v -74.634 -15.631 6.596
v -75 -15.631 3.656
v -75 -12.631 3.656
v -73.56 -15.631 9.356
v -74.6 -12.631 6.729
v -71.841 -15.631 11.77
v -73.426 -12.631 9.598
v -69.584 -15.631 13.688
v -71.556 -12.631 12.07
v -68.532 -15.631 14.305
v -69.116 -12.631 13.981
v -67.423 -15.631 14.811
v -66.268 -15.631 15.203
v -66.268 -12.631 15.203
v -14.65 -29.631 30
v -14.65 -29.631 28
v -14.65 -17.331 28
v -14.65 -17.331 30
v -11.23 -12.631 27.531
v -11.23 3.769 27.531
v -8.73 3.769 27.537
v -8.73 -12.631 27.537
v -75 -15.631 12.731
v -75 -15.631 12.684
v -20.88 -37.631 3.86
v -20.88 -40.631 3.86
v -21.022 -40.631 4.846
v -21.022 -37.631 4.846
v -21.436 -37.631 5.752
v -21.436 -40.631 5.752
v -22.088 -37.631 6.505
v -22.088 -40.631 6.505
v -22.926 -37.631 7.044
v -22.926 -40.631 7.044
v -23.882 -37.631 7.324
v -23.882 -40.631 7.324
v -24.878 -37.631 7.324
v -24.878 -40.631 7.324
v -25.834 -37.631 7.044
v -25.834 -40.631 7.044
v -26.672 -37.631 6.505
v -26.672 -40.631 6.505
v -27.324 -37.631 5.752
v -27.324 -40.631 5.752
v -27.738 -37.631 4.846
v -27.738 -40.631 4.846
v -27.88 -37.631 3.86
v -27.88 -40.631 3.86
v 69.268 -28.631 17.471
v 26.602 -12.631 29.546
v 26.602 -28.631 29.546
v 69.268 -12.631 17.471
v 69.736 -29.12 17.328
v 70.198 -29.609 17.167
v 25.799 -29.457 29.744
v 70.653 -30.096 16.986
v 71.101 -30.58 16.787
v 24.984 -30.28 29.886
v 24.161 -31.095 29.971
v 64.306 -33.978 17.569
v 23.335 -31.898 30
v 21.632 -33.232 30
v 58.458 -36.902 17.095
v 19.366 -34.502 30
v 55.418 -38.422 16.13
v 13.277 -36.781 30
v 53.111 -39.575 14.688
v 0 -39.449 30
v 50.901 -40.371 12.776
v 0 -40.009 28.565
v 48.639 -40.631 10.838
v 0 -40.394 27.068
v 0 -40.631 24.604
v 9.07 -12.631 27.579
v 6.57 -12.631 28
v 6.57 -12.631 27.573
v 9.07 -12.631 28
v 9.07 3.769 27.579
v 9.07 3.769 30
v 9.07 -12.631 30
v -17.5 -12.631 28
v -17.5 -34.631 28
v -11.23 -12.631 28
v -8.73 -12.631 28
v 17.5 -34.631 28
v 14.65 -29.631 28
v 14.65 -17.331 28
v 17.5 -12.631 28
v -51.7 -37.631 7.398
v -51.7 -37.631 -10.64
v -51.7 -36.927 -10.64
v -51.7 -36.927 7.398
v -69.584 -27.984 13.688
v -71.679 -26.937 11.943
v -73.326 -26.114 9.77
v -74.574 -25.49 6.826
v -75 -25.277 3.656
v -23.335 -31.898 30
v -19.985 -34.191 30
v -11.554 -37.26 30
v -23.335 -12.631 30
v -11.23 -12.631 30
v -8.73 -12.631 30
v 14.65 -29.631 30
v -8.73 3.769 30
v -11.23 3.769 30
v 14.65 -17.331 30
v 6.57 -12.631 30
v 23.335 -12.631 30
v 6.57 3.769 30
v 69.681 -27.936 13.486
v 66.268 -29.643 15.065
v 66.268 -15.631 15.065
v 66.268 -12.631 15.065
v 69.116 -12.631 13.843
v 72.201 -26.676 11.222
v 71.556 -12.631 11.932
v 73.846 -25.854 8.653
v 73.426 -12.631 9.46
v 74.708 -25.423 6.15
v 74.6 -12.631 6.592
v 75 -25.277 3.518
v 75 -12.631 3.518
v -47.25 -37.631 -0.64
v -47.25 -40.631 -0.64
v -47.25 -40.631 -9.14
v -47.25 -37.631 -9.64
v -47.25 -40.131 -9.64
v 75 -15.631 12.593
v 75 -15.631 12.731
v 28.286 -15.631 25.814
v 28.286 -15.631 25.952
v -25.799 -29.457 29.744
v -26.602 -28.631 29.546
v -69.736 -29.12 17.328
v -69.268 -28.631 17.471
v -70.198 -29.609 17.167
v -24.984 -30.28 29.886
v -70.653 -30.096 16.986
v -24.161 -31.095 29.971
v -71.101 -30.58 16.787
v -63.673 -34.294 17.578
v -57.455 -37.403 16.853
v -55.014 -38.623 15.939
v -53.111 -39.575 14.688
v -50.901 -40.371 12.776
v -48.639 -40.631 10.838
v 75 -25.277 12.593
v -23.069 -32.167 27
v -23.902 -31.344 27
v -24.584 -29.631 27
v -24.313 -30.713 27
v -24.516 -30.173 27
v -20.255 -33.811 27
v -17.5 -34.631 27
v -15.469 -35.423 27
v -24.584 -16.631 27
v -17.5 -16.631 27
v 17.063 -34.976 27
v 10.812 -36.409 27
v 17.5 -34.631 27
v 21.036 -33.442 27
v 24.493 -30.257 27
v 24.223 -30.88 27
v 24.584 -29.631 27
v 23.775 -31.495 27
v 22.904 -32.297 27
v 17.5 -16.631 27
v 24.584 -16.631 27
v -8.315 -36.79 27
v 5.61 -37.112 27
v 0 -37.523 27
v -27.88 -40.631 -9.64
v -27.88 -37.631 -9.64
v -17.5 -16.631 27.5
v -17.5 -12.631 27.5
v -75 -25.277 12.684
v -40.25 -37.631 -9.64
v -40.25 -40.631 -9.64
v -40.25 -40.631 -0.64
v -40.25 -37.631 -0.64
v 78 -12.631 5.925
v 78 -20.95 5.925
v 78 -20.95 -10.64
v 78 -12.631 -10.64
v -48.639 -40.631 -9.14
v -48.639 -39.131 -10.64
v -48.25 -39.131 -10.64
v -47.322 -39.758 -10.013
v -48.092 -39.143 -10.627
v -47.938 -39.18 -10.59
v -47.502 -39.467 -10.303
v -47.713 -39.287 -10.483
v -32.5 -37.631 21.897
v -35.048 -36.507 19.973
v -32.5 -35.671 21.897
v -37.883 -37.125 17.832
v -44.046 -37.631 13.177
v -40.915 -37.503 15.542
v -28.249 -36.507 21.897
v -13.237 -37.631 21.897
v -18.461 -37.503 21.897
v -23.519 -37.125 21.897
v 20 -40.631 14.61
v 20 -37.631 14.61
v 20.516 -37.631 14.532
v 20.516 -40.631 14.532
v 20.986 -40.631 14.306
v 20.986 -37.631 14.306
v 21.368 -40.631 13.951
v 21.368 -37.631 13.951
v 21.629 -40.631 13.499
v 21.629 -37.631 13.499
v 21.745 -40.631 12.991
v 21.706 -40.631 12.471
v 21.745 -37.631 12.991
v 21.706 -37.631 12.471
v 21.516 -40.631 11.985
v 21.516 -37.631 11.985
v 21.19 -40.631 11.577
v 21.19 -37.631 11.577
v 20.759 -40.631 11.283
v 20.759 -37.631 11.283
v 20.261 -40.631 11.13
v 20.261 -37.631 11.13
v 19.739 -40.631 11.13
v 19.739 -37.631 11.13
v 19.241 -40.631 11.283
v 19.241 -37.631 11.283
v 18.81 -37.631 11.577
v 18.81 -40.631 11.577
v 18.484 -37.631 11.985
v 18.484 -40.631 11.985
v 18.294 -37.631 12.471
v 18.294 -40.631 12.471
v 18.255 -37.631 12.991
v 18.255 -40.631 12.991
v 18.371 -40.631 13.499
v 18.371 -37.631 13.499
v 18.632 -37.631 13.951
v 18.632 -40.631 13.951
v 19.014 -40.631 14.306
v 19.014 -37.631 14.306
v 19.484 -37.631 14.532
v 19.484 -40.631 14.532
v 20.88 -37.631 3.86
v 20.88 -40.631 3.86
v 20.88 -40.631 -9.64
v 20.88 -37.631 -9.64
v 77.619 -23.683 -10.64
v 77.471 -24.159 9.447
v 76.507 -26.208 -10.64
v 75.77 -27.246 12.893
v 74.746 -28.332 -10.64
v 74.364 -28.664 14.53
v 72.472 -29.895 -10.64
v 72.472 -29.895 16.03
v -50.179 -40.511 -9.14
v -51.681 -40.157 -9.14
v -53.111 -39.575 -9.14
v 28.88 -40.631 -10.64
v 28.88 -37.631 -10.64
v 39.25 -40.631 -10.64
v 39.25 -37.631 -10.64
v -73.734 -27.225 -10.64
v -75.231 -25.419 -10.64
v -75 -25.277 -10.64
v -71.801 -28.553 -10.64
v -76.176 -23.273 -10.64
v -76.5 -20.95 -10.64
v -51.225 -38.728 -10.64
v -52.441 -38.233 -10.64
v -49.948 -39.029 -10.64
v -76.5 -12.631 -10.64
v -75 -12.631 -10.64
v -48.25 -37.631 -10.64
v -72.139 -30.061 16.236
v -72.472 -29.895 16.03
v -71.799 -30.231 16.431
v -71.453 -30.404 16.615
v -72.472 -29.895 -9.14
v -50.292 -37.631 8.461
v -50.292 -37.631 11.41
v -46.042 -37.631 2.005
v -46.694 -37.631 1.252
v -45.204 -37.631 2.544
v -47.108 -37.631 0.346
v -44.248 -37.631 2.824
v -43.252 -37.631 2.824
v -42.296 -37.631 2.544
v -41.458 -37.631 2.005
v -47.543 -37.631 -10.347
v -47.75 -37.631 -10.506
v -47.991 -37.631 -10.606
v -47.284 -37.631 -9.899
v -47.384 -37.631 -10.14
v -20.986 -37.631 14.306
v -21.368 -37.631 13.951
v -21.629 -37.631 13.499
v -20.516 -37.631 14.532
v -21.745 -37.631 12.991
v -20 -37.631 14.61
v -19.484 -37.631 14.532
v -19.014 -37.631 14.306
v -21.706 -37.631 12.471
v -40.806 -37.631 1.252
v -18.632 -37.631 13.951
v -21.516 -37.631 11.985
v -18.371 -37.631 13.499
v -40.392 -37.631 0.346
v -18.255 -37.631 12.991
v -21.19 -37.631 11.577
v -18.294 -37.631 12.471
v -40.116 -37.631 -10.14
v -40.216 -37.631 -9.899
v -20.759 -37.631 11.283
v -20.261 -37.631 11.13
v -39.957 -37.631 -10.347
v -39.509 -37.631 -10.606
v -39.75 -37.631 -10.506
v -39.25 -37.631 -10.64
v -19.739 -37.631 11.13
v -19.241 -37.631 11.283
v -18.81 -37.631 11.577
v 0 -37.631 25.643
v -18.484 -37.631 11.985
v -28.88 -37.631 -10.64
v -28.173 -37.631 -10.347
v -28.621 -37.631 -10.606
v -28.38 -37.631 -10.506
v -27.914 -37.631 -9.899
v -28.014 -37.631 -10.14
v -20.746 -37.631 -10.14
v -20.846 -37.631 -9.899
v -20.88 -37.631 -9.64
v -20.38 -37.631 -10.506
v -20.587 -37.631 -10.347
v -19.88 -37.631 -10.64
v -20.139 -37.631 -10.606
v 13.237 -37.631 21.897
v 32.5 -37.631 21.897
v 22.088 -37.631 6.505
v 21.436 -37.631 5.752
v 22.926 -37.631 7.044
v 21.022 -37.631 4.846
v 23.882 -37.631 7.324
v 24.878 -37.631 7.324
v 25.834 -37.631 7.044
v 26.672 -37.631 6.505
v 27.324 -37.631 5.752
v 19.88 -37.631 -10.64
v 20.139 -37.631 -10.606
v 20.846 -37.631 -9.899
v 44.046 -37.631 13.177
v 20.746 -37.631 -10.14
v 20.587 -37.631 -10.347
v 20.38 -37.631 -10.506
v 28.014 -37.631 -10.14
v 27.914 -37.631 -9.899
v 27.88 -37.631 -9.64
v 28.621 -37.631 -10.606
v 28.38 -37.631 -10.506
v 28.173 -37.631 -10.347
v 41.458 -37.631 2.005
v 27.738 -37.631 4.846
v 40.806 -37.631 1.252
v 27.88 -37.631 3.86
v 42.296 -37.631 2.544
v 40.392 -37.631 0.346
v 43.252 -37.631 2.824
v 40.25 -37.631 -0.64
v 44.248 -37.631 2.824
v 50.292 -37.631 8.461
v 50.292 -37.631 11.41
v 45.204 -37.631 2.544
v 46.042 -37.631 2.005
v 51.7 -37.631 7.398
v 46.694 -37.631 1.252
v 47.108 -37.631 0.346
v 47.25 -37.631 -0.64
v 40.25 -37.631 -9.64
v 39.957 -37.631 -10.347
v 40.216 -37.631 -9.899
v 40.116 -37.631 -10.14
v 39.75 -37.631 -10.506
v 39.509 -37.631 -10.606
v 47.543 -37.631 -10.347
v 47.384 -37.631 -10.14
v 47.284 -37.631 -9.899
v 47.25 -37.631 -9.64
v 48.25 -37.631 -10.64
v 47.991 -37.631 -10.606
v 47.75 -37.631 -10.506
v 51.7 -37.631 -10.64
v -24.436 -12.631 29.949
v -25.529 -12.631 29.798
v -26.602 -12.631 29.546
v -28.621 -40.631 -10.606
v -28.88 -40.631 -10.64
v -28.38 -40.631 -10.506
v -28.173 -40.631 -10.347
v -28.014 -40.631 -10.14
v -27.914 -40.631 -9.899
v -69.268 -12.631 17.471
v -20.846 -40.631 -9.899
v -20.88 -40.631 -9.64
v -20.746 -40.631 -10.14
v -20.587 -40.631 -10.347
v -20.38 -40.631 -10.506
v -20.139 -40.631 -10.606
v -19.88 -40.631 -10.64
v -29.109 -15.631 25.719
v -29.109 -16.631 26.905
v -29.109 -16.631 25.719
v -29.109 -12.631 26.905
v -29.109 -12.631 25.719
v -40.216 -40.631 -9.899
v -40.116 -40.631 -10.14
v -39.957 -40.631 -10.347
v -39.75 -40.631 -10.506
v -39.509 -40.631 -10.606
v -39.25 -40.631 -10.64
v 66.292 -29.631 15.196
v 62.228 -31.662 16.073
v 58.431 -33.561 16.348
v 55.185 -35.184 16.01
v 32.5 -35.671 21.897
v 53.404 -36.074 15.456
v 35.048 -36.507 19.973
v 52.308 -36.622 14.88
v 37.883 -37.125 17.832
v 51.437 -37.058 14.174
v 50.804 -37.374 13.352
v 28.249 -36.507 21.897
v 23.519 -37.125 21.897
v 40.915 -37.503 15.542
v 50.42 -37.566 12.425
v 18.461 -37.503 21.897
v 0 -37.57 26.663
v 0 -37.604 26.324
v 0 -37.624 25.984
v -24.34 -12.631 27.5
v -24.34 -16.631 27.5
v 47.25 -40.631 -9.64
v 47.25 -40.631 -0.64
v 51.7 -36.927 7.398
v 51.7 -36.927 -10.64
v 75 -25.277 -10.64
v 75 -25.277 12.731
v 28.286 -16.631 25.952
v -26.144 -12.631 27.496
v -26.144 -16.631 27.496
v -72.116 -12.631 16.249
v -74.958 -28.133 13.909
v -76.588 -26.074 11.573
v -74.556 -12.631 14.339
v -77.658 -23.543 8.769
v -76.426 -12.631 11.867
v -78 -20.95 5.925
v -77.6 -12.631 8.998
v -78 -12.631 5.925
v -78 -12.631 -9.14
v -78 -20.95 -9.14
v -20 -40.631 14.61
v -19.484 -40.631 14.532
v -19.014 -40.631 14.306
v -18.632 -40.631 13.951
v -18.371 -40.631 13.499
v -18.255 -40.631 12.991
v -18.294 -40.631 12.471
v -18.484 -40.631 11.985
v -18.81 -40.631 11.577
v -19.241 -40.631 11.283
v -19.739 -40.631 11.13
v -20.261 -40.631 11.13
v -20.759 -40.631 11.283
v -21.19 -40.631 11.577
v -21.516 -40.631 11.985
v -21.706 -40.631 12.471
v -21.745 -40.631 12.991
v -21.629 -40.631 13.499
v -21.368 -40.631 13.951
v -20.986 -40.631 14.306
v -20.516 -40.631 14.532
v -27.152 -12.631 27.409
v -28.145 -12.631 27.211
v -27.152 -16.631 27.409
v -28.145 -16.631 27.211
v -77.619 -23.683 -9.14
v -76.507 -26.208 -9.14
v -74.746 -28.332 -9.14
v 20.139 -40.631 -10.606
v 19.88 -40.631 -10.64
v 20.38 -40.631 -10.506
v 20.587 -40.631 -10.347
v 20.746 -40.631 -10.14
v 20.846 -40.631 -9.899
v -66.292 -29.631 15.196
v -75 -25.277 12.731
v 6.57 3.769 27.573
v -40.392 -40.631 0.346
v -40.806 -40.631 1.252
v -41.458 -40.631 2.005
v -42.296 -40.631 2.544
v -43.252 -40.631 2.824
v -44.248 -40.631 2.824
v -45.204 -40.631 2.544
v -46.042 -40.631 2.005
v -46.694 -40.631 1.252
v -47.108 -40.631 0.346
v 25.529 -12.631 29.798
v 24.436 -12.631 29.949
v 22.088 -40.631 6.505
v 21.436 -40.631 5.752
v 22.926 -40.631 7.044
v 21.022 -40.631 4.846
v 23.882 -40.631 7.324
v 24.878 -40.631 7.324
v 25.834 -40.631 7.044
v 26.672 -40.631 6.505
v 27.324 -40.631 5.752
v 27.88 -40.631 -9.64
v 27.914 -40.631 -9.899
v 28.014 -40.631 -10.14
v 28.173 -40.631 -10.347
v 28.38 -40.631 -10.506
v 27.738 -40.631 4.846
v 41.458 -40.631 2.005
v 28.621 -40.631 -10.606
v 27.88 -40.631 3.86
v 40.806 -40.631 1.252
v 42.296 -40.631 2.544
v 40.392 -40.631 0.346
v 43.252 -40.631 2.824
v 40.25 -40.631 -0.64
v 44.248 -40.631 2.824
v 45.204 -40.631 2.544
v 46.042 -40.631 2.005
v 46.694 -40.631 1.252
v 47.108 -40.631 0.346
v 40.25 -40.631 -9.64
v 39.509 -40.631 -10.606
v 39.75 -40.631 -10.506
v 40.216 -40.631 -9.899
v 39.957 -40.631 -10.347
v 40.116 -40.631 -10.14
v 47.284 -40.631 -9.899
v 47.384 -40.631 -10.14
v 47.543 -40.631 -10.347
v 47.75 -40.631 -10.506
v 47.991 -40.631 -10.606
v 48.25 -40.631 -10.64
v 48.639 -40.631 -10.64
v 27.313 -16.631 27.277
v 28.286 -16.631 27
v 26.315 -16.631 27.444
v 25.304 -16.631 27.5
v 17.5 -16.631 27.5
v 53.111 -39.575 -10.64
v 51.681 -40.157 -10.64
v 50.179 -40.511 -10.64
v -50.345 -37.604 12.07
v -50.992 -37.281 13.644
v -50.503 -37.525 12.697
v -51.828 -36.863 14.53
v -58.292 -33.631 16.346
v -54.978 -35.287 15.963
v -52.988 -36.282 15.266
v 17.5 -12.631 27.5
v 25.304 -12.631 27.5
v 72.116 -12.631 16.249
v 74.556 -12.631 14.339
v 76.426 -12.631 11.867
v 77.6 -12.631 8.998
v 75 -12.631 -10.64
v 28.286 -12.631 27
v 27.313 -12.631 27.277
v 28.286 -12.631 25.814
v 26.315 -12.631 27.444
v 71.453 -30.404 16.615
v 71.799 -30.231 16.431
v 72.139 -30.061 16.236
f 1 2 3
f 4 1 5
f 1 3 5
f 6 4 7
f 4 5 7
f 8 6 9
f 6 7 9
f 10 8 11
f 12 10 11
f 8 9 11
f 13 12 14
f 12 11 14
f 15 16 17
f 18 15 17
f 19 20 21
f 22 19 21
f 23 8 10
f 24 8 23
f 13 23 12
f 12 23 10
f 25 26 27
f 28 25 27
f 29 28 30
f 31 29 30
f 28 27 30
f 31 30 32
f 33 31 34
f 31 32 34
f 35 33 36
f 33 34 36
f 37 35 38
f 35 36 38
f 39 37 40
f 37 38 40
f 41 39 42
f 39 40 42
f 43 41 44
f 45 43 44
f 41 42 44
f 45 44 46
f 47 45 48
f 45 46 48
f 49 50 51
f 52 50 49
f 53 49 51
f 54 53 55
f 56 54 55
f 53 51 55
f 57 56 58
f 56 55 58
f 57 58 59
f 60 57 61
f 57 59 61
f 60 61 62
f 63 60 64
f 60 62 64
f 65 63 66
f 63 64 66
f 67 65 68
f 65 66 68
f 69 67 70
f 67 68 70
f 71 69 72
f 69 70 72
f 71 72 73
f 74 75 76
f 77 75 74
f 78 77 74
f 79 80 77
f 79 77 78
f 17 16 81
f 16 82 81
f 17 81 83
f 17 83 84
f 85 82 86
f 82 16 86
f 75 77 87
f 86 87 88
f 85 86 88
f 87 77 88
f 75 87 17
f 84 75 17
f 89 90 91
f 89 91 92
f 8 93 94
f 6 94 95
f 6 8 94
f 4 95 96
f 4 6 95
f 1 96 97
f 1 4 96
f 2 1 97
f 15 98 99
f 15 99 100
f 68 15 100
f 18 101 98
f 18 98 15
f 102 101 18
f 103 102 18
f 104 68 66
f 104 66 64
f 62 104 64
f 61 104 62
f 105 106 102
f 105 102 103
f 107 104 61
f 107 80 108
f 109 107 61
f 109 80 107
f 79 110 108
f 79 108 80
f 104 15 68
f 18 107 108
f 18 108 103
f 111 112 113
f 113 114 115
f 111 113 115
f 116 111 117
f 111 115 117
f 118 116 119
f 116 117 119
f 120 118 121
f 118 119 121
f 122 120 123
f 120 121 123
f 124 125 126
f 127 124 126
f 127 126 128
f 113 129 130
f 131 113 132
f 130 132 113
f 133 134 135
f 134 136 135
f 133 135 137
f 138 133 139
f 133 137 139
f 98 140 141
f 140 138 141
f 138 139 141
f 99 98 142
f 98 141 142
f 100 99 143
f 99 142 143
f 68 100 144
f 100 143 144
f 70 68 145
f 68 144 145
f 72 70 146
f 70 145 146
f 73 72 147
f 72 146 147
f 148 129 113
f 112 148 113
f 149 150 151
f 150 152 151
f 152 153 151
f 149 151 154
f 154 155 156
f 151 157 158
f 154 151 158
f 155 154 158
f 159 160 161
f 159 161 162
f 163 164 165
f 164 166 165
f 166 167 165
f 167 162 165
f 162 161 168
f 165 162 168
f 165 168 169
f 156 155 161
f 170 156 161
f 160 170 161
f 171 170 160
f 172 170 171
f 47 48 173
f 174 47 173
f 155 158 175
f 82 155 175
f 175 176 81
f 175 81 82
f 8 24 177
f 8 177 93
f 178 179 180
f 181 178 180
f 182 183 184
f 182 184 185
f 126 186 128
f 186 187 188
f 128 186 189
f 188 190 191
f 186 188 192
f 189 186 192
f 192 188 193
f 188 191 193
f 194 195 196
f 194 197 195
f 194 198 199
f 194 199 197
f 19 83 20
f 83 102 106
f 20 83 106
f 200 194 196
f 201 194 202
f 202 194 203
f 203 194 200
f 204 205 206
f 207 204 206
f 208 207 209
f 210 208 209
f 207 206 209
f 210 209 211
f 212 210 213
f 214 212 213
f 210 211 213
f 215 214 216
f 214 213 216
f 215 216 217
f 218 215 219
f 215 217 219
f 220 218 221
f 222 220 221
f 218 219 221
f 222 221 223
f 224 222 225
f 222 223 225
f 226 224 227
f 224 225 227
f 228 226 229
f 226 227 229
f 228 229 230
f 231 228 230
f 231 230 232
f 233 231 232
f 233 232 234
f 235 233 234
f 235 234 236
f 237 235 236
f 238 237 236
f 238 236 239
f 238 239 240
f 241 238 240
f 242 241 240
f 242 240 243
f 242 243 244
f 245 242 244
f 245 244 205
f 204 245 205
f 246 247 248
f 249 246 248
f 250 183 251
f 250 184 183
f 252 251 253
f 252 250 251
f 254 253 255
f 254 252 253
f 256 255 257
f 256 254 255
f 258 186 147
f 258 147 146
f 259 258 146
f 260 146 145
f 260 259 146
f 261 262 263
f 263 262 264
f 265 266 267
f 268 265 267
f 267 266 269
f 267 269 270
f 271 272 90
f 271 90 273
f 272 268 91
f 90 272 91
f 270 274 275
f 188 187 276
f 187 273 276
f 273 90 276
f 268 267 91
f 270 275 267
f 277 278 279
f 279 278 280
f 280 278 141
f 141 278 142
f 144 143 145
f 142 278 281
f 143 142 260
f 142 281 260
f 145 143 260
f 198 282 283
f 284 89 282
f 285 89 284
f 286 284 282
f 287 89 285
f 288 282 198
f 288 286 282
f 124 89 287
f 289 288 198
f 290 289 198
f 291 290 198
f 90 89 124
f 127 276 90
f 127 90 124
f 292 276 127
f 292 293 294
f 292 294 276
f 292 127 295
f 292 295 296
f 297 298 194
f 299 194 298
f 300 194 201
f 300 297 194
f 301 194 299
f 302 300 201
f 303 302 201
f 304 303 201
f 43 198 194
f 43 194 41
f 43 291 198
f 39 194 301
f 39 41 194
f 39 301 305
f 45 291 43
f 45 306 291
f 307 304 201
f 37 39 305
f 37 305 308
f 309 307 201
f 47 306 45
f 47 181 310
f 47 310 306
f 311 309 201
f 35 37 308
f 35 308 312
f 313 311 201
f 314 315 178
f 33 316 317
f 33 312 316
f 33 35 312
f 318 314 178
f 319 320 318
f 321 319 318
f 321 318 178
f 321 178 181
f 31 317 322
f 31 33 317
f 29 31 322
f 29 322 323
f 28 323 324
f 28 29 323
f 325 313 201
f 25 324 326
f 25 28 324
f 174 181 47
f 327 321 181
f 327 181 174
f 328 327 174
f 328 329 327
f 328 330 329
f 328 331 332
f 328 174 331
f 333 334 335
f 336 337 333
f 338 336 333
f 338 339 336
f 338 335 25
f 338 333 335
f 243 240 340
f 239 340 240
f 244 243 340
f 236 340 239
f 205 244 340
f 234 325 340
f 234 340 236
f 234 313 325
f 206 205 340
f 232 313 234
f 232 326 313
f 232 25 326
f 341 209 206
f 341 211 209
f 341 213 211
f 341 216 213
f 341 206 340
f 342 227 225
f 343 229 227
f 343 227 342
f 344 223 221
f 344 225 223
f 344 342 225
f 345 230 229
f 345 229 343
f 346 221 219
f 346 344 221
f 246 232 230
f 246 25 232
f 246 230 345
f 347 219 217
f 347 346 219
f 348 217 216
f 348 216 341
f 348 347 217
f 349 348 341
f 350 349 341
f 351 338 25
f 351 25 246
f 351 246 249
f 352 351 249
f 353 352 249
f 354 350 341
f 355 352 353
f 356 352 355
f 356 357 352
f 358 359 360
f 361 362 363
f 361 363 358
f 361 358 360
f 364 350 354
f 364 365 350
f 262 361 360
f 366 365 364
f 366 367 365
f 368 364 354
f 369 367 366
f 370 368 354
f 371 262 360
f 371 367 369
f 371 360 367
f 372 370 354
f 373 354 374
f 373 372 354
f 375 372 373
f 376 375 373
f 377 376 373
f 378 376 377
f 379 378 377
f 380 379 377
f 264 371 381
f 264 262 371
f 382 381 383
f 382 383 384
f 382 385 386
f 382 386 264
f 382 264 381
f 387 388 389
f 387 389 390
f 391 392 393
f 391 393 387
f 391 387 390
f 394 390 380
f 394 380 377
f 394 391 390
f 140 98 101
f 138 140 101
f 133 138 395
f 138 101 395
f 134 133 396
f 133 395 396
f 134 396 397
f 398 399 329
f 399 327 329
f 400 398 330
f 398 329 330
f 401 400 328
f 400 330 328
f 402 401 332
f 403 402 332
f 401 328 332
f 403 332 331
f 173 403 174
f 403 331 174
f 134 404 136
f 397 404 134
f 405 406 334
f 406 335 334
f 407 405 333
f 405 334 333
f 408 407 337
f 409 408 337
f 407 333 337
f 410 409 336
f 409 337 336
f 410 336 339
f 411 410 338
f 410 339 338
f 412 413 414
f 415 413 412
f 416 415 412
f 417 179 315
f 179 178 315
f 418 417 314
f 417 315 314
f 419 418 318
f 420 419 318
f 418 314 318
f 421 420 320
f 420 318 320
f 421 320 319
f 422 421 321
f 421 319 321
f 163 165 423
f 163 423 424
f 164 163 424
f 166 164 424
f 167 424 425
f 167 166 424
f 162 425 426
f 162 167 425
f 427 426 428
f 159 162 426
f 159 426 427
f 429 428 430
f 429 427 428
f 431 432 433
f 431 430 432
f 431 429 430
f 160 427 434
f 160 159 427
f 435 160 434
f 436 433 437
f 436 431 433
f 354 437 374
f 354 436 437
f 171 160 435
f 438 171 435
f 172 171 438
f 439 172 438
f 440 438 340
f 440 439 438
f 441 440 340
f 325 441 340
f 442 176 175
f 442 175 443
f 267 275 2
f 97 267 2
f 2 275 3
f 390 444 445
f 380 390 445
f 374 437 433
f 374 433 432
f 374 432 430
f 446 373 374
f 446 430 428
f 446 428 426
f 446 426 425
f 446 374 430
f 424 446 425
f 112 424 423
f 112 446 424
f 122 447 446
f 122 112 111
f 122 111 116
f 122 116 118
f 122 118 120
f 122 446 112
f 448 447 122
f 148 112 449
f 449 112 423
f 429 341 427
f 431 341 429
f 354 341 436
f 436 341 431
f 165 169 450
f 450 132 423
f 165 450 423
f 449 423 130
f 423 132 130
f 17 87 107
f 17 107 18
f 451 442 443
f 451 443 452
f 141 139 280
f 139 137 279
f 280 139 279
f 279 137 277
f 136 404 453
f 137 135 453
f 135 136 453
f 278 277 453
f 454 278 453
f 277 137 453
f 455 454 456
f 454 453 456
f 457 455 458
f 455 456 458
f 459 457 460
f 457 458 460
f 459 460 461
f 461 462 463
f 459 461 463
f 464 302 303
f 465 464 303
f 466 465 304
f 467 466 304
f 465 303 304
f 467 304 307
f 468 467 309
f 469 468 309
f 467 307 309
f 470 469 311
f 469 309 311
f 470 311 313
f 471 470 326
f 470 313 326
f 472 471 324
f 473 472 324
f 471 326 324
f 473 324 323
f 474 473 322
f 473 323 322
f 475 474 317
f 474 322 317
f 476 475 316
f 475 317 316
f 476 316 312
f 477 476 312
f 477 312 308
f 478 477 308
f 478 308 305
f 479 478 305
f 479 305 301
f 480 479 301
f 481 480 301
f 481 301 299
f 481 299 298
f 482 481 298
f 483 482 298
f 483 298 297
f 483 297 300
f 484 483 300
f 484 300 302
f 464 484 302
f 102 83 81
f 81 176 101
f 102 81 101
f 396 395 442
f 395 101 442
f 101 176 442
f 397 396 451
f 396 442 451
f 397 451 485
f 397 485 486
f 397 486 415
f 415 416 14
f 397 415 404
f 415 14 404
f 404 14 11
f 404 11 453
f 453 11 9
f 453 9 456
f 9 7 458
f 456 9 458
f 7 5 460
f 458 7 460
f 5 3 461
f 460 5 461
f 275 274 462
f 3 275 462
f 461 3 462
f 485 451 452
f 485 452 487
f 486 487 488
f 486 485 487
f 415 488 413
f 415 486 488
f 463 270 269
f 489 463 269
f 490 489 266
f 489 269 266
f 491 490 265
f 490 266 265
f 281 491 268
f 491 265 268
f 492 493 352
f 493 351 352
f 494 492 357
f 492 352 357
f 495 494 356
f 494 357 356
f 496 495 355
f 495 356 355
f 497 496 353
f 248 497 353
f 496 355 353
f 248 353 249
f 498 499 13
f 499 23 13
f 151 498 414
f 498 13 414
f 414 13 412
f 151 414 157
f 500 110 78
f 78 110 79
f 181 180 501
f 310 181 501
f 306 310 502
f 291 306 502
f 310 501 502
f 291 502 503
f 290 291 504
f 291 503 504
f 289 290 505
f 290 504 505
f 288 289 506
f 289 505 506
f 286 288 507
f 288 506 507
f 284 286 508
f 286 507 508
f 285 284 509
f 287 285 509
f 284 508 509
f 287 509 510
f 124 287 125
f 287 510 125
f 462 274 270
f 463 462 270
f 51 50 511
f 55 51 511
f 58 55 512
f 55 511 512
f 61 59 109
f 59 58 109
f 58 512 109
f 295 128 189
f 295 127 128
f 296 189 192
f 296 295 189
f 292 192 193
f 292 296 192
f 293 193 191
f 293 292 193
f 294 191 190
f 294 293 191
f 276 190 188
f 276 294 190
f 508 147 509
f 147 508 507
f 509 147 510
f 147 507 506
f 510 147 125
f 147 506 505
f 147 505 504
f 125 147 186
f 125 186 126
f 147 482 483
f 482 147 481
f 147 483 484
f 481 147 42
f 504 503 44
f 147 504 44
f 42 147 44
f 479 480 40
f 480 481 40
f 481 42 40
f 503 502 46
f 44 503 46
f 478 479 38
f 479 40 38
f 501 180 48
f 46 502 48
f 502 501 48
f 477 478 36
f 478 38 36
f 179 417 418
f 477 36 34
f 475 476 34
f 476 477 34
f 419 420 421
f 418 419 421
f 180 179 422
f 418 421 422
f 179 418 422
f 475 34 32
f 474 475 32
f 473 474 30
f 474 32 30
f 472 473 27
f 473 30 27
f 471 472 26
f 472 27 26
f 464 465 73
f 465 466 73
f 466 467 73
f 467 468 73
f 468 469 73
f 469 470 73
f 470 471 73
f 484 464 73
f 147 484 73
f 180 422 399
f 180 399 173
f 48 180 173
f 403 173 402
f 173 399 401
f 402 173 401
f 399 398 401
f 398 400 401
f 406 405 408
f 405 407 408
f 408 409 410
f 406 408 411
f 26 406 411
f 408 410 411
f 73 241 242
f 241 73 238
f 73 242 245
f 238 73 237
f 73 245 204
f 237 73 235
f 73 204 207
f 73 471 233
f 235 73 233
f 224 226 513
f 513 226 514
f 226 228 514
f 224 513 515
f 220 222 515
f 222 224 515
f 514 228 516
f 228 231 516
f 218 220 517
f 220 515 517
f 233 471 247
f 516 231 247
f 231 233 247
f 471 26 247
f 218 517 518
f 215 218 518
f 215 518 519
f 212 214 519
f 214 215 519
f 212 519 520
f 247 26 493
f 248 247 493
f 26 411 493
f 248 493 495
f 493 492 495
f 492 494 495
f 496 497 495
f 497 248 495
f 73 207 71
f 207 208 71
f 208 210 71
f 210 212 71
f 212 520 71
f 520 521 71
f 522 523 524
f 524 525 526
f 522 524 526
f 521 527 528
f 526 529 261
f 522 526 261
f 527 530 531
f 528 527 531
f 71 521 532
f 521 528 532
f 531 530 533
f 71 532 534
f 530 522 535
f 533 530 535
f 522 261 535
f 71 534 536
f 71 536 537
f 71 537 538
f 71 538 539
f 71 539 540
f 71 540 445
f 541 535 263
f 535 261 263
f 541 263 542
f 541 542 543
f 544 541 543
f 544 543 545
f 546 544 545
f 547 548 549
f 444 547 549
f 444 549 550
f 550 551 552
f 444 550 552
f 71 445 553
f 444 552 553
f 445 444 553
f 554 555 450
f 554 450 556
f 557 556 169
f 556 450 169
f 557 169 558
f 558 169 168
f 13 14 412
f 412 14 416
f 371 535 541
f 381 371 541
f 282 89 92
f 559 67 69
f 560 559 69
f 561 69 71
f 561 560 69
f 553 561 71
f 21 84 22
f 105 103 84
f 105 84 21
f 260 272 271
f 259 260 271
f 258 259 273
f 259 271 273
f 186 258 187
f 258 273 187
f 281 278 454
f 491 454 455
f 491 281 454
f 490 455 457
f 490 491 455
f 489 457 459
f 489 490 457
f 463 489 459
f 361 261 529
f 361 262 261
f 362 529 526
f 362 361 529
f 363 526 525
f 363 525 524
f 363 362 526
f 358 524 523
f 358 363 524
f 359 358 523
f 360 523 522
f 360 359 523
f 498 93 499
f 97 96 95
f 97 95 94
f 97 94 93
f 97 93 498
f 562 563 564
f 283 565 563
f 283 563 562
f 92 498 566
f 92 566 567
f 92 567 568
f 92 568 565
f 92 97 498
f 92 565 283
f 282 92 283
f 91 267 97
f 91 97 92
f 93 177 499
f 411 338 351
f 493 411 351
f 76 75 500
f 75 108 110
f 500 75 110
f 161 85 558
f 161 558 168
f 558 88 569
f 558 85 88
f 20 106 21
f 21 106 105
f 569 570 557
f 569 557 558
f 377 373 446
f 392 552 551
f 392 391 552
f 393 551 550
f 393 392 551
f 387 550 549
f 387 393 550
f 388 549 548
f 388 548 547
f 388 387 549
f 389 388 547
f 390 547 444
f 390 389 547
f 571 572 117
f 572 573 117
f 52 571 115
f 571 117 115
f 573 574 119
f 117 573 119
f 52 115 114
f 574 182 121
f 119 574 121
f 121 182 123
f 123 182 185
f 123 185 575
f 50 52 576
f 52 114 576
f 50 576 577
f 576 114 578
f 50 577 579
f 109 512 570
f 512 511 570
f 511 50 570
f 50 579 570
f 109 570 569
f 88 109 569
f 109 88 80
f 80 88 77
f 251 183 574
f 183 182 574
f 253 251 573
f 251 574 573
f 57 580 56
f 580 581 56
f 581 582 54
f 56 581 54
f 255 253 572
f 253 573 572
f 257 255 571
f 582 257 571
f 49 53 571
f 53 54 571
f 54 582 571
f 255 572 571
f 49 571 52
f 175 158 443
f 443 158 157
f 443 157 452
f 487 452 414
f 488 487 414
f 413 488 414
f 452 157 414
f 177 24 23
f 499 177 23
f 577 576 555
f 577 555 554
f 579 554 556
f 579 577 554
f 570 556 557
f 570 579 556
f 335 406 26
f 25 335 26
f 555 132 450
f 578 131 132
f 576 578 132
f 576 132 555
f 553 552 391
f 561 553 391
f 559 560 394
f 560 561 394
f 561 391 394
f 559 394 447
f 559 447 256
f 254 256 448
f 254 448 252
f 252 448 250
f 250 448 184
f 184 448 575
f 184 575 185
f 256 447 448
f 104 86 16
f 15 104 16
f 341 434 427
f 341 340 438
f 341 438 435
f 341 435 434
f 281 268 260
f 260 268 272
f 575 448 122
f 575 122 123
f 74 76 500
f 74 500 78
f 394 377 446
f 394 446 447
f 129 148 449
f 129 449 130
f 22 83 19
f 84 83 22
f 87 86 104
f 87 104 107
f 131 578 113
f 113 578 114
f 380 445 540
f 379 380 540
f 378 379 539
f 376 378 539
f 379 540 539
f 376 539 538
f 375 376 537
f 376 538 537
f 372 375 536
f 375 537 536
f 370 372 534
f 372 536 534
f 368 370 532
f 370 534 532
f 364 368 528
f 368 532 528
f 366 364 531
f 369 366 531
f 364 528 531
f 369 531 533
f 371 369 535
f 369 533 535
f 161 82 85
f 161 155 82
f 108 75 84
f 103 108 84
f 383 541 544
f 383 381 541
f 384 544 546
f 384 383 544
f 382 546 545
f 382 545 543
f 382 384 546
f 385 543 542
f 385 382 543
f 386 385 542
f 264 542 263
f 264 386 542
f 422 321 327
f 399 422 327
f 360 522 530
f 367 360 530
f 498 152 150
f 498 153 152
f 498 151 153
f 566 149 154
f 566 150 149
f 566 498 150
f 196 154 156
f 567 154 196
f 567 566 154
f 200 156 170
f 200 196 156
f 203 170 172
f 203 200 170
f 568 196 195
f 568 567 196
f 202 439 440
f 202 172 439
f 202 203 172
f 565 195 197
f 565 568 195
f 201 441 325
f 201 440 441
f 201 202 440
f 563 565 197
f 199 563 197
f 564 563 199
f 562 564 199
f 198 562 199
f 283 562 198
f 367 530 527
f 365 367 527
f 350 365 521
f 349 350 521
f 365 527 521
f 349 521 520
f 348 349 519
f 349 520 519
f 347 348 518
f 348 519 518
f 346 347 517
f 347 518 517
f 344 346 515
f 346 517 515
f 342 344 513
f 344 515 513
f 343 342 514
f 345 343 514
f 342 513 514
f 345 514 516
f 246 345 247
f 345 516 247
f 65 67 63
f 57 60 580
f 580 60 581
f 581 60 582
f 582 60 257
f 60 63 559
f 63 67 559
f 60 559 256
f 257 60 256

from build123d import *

# Parameters (mm, degrees)
BOSS_EXTRUDE1_DEPTH      = 30
BOSS_EXTRUDE1_DEPTH_BACK = 10.64
CUT_EXTRUDE1_DEPTH       = 89.136258146
SHELL1_T                 = -3
CUT_EXTRUDE4_DEPTH       = 4
CUT_EXTRUDE4_DEPTH_BACK  = 10
FILLET3_R                = 8
FILLET1_R                = 12
SKETCH4_R                = 1.75
CUT_EXTRUDE2_DEPTH       = 30
BOSS_EXTRUDE5_REACH      = 89.23
CUT_EXTRUDE5_DEPTH       = 4
SKETCH12_W               = 29.3
SKETCH12_H               = 12.3
CUT_EXTRUDE6_DEPTH       = 3
CUT_EXTRUDE7_DEPTH       = 22
FILLET2_START            = -12
FILLET2_DEPTH            = 29.471357663
BOSS_EXTRUDE4_REACH      = 98.884
SKETCH14_W               = 2.5
SKETCH14_H               = 16.4
SKETCH18_R               = 3.5
CUT_EXTRUDE11_DEPTH      = 10
CUT_EXTRUDE12_DEPTH      = 10
CHAMFER1_SIZE            = 1.5
FILLET5_R                = 1


with BuildPart() as part:
    # Sketch1 → Boss-Extrude1 (new, two sides: drawn at the far end of the back side and taken through both)
    with BuildSketch(Plane.XY.offset(-BOSS_EXTRUDE1_DEPTH_BACK)):
        Polygon((-51, -40.630628171), (51, -40.630628171), (78, -27.130628171), (78, -12.630628171), (-78, -12.630628171), (-78, -27.130628171), align=None)
    extrude(amount=BOSS_EXTRUDE1_DEPTH + BOSS_EXTRUDE1_DEPTH_BACK)

    # Sketch2 → Cut-Extrude1 (cut, through all)
    with BuildSketch(Plane(origin=(0, -12.630628171, 0), x_dir=(1, 0, 0), z_dir=(0, 1, 0))):
        Polygon((-78, -15), (-25, -30), (25, -30), (78, -15), (78, -44.649515781), (-78, -44.649515781), align=None)
    extrude(amount=-CUT_EXTRUDE1_DEPTH, mode=Mode.SUBTRACT)

    # Shell1
    shell1_openings = [part.faces().sort_by_distance(p)[0] for p in [
        (0, -25.765697486, -10.64),
    ]]
    offset(amount=SHELL1_T, openings=shell1_openings, kind=Kind.INTERSECTION)

    # Sketch7 → Cut-Extrude4 (cut, two sides: drawn at the far end of the back side and taken through both)
    with BuildSketch(Plane.XZ.offset(15.630628171).offset(-CUT_EXTRUDE4_DEPTH_BACK)):
        with BuildLine():
            Line((-24.583648517, 27), (24.096351483, 27))
            Line((24.096351483, 27), (66.26786959, 15.064664687))
            ThreePointArc((66.26786959, 15.064664687), (72.571165945, 10.756478016), (75, 3.518192137))
            Line((75, 3.518192137), (75, -10.64))
            Line((75, -10.64), (-75, -10.64))
            Line((-75, -10.64), (-75, 3.656106392))
            ThreePointArc((-75, 3.656106392), (-72.571165945, 10.894392271), (-66.26786959, 15.202578942))
            Line((-66.26786959, 15.202578942), (-24.583648517, 27))
        make_face()
    extrude(amount=CUT_EXTRUDE4_DEPTH + CUT_EXTRUDE4_DEPTH_BACK, mode=Mode.SUBTRACT)

    # Fillet3
    # the kernel refuses this fillet: 8 mm, written as the material it adds along each edge
    with BuildSketch(Plane(origin=(-69.535916984, -37.630628171, 14.277659868), x_dir=(0.27232246579934893, 0, -0.9622060458243663), z_dir=(0.9622060458243663, 0, 0.27232246579934893))) as fillet3_piece_1_section:
        with BuildLine():
            CenterArc((FILLET3_R, FILLET3_R), FILLET3_R, 180, 90)
            Line((0, FILLET3_R), (0, 0))
            Line((0, 0), (FILLET3_R, 0))
        make_face()
    fillet3_piece_1 = extrude(amount=80.717923528, mode=Mode.PRIVATE)
    fillet3_piece_1 = split(fillet3_piece_1, bisect_by=Plane(origin=(-65.687092801, -29.932979805, 14.277659868), z_dir=(0.44721359549995787, 0.894427190999916, 0)), keep=Keep.TOP, mode=Mode.PRIVATE)
    fillet3_piece_1 = split(fillet3_piece_1, bisect_by=Plane(origin=(-69.535916984, -37.630628171, 27), z_dir=(0, 0, -1)), keep=Keep.TOP, mode=Mode.PRIVATE)
    add(fillet3_piece_1)
    with BuildSketch(Plane(origin=(-8.131357041, -37.630628171, 36.258963837), x_dir=(-0.27232246579934893, 0, -0.9622060458243663), z_dir=(0.9622060458243663, 0, -0.27232246579934893))) as fillet3_piece_2_section:
        with BuildLine():
            CenterArc((FILLET3_R, FILLET3_R), FILLET3_R, 180, 90)
            Line((0, FILLET3_R), (0, 0))
            Line((0, 0), (FILLET3_R, 0))
        make_face()
    fillet3_piece_2 = extrude(amount=80.717923528, mode=Mode.PRIVATE)
    fillet3_piece_2 = split(fillet3_piece_2, bisect_by=Plane(origin=(3.553273581, -60.999889415, 36.258963837), z_dir=(-0.44721359549995787, 0.894427190999916, 0)), keep=Keep.TOP, mode=Mode.PRIVATE)
    fillet3_piece_2 = split(fillet3_piece_2, bisect_by=Plane(origin=(-8.131357041, -37.630628171, 27), z_dir=(0, 0, -1)), keep=Keep.TOP, mode=Mode.PRIVATE)
    add(fillet3_piece_2)

    # Fillet1
    # the kernel refuses this fillet: 12 mm, written as the material it takes off along each edge
    with BuildSketch(Plane(origin=(78, 10.057159045, 15), x_dir=(-0.9622060458243663, 0, 0.2723224657993491), z_dir=(0, -1, 0)), Plane(origin=(-78, 10.057159045, 15), x_dir=(0, 0, -1), z_dir=(0, -1, 0))) as fillet1_piece_1:
        with BuildLine():
            CenterArc((FILLET1_R * 0.756259573881, FILLET1_R), FILLET1_R, 195.802513954, 74.197486046)
            Line((-FILLET1_R * 0.205946471944, FILLET1_R * 0.727677534201), (0, 0))
            Line((0, 0), (FILLET1_R * 0.756259573881, 0))
        make_face()
    extrude(amount=59.875574433, mode=Mode.SUBTRACT)
    with BuildSketch(Plane(origin=(25, -8.46711334, 30), x_dir=(0.9622060458243658, 0, -0.27232246579935065), z_dir=(0, -1, 0))) as fillet1_piece_2:
        with BuildLine():
            CenterArc((FILLET1_R * 0.138783827712, -FILLET1_R), FILLET1_R, 90, 15.802513954)
            Line((-FILLET1_R * 0.133538638087, -FILLET1_R * 0.0377939541756), (0, 0))
            Line((0, 0), (FILLET1_R * 0.138783827712, 0))
        make_face()
    extrude(amount=36.327029663, mode=Mode.SUBTRACT)
    with BuildSketch(Plane(origin=(-24.072508337, -40.630628171, 43.888445756), x_dir=(0, 1, 0), z_dir=(0.9622060458243663, 0, -0.27232246579934893)), Plane(origin=(-79.866181375, -40.630628171, 14.47183546), x_dir=(0, 1, 0), z_dir=(0.9622060458243663, 0, 0.27232246579934893))) as fillet1_piece_3:
        with BuildLine():
            CenterArc((FILLET1_R, -FILLET1_R), FILLET1_R, 90, 90)
            Line((0, -FILLET1_R), (0, 0))
            Line((0, 0), (FILLET1_R, 0))
        make_face()
    extrude(amount=108.021239487, mode=Mode.SUBTRACT)
    with BuildSketch(Plane(origin=(-25, -8.46711334, 30), x_dir=(-0.9622060458243663, 0, -0.272322465799349), z_dir=(0, -1, 0))) as fillet1_piece_4:
        with BuildLine():
            CenterArc((FILLET1_R * 0.138783827712, FILLET1_R), FILLET1_R, 254.197486046, 15.802513954)
            Line((-FILLET1_R * 0.133538638087, FILLET1_R * 0.0377939541756), (0, 0))
            Line((0, 0), (FILLET1_R * 0.138783827712, 0))
        make_face()
    extrude(amount=36.327029663, mode=Mode.SUBTRACT)

    # Sketch4 → Cut-Extrude2 (cut)
    with BuildSketch(Plane(origin=(0, -37.630628171, 0), x_dir=(1, 0, 0), z_dir=(0, 1, 0))):
        with Locations(Location((-20, -12.86, 0), (0, 0, 270))):
            Circle(SKETCH4_R)
        with Locations(Location((20, -12.86, 0), (0, 0, 270))):
            Circle(SKETCH4_R)
    extrude(amount=-CUT_EXTRUDE2_DEPTH, mode=Mode.SUBTRACT)

    # Sketch10 → Boss-Extrude5 (add, up to next)
    with BuildSketch(Plane(origin=(0, -15.630628171, 0), x_dir=(1, 0, 0), z_dir=(0, 1, 0)), mode=Mode.PRIVATE) as boss_extrude5_sk1:
        with BuildLine():
            Line((75, -3.518192137), (75, -12.593307024))
            Line((75, -12.593307024), (66.26786959, -15.064664687))
            ThreePointArc((66.26786959, -15.064664687), (72.571165945, -10.756478016), (75, -3.518192137))
        make_face()
    boss_extrude5_tool1 = extrude(boss_extrude5_sk1.sketch, amount=-BOSS_EXTRUDE5_REACH, mode=Mode.PRIVATE) - part.part
    # Sketch10 → Boss-Extrude5 (add, up to next)
    with BuildSketch(Plane(origin=(0, -15.630628171, 0), x_dir=(1, 0, 0), z_dir=(0, 1, 0)), mode=Mode.PRIVATE) as boss_extrude5_sk2:
        with BuildLine():
            Line((-75.487297034, -12.593307024), (-69.584469585, -13.688292608))
            ThreePointArc((-69.584469585, -13.688292608), (-73.559678854, -9.356385551), (-75, -3.656106392))
            Line((-75, -3.656106392), (-75.487297034, -12.593307024))
        make_face()
    boss_extrude5_tool2 = extrude(boss_extrude5_sk2.sketch, amount=-BOSS_EXTRUDE5_REACH, mode=Mode.PRIVATE) - part.part
    add(boss_extrude5_tool1.solids().sort_by_distance((73.119365, -15.630628, 11.171058))[0])
    add(boss_extrude5_tool2.solids().sort_by_distance((-73.752935, -15.630628, 10.714464))[0])

    # Sketch11 → Cut-Extrude5 (cut)
    with BuildSketch(Plane(origin=(0, -12.630628171, 0), x_dir=(1, 0, 0), z_dir=(0, 1, 0))):
        with BuildLine():
            Line((-24.583648517, -27), (24.096351483, -27))
            Line((24.096351483, -27), (28.286429465, -25.814128873))
            Line((28.286429465, -25.814128873), (28.286429465, -27))
            ThreePointArc((28.286429465, -27), (26.816277128, -27.374133532), (25.30449625, -27.5))
            Line((25.30449625, -27.5), (24.30449625, -27.5))
            Line((24.30449625, -27.5), (-24.34, -27.5))
            Line((-24.34, -27.5), (-26.144116779, -27.495743925))
            ThreePointArc((-26.144116779, -27.495743925), (-27.651353583, -27.323810768), (-29.109406457, -26.904996238))
            Line((-29.109406457, -26.904996238), (-29.109406457, -25.719125111))
            Line((-29.109406457, -25.719125111), (-24.583648517, -27))
        make_face()
    extrude(amount=-CUT_EXTRUDE5_DEPTH, mode=Mode.SUBTRACT)

    # Sketch12 → Cut-Extrude6 (cut)
    with BuildSketch(Plane(origin=(0, 0, 27), x_dir=(-1, 0, 0), z_dir=(0, 0, -1))):
        with Locations((0, -23.480628171)):
            Rectangle(SKETCH12_W, SKETCH12_H)
    extrude(amount=-CUT_EXTRUDE6_DEPTH, mode=Mode.SUBTRACT)

    # Sketch13 → Cut-Extrude7 (cut)
    with BuildSketch(Plane(origin=(0, -12.630628171, 0), x_dir=(1, 0, 0), z_dir=(0, 1, 0))):
        Polygon((0, -28), (17.5, -28), (17.5, -24), (-17.5, -24), (-17.5, -28), align=None)
    extrude(amount=-CUT_EXTRUDE7_DEPTH, mode=Mode.SUBTRACT)

    # Fillet2: read off the stored shape, not the designer's step
    # Fillet2 outline → Fillet2 (cut)
    with BuildSketch(Plane.XY.offset(FILLET2_START)):
        with BuildLine():
            ThreePointArc((78, -20.950288284), (76.506508084, -26.207599405), (72.472135955, -29.894560194))
            Line((72.472135955, -29.894560194), (78, -27.130628171))
            Line((78, -27.130628171), (78, -20.950288284))
        make_face()
        with BuildLine():
            ThreePointArc((53.11145618, -39.574900081), (50.936849431, -40.363118066), (48.639320225, -40.630628171))
            Line((48.639320225, -40.630628171), (51, -40.630628171))
            Line((51, -40.630628171), (53.11145618, -39.574900081))
        make_face()
        with BuildLine():
            ThreePointArc((-48.639320225, -40.630628171), (-50.936849431, -40.363118066), (-53.11145618, -39.574900081))
            Line((-53.11145618, -39.574900081), (-51, -40.630628171))
            Line((-51, -40.630628171), (-48.639320225, -40.630628171))
        make_face()
        with BuildLine():
            ThreePointArc((-72.472135955, -29.894560194), (-76.506508084, -26.207599405), (-78, -20.950288284))
            Line((-78, -20.950288284), (-78, -27.130628171))
            Line((-78, -27.130628171), (-72.472135955, -29.894560194))
        make_face()
    extrude(amount=FILLET2_DEPTH, mode=Mode.SUBTRACT)

    # Boss-Extrude4: up to this plane
    boss_extrude4_end = Plane(origin=(-24.34, -16.630628171, 27.5), z_dir=(-0.0023590840693536327, 0, 0.9999972173573053))
    # Sketch14 → Boss-Extrude4 (add, up to the surface)
    with BuildSketch(Plane.XY.offset(30), mode=Mode.PRIVATE) as boss_extrude4_sk1:
        with Locations((-9.98, -4.430628171)):
            Rectangle(SKETCH14_W, SKETCH14_H)
    boss_extrude4_tool1 = split(extrude(boss_extrude4_sk1.sketch, amount=-BOSS_EXTRUDE4_REACH, mode=Mode.PRIVATE), bisect_by=boss_extrude4_end, keep=Keep.BOTH, mode=Mode.PRIVATE)
    add(boss_extrude4_tool1.solids().sort_by_distance((-9.98, -4.430628, 30))[0])
    # Sketch14 → Boss-Extrude4 (add, up to the surface)
    with BuildSketch(Plane.XY.offset(30), mode=Mode.PRIVATE) as boss_extrude4_sk2:
        with Locations((7.82, -4.430628171)):
            Rectangle(SKETCH14_W, SKETCH14_H)
    boss_extrude4_tool2 = split(extrude(boss_extrude4_sk2.sketch, amount=-BOSS_EXTRUDE4_REACH, mode=Mode.PRIVATE), bisect_by=boss_extrude4_end, keep=Keep.BOTH, mode=Mode.PRIVATE)
    add(boss_extrude4_tool2.solids().sort_by_distance((7.82, -4.430628, 30))[0])

    # Sketch18 → Cut-Extrude11 (cut)
    with BuildSketch(Plane.XZ.offset(40.630628171)):
        with BuildLine():
            ThreePointArc((-20.88, 3.86), (-24.38, 0.36), (-27.88, 3.86))
            Line((-27.88, 3.86), (-27.88, -10.64))
            Line((-27.88, -10.64), (-20.88, -10.64))
            Line((-20.88, -10.64), (-20.88, 3.86))
        make_face()
        with Locations((-24.38, 3.86)):
            Circle(SKETCH18_R)
        with Locations((-43.75, -0.64)):
            Circle(SKETCH18_R)
        with BuildLine():
            Line((-47.25, -10.64), (-40.25, -10.64))
            Line((-40.25, -10.64), (-40.25, -0.64))
            ThreePointArc((-40.25, -0.64), (-43.75, -4.14), (-47.25, -0.64))
            Line((-47.25, -0.64), (-47.25, -10.64))
        make_face()
        with BuildLine():
            Line((20.88, 3.86), (20.88, -10.64))
            Line((20.88, -10.64), (27.88, -10.64))
            Line((27.88, -10.64), (27.88, 3.86))
            ThreePointArc((27.88, 3.86), (24.38, 0.36), (20.88, 3.86))
        make_face()
        with Locations((24.38, 3.86)):
            Circle(SKETCH18_R)
        with BuildLine():
            Line((40.25, -0.64), (40.25, -10.64))
            Line((40.25, -10.64), (47.25, -10.64))
            Line((47.25, -10.64), (47.25, -0.64))
            ThreePointArc((47.25, -0.64), (43.75, -4.14), (40.25, -0.64))
        make_face()
        with Locations((43.75, -0.64)):
            Circle(SKETCH18_R)
    extrude(amount=-CUT_EXTRUDE11_DEPTH, mode=Mode.SUBTRACT)

    # Sketch19 → Cut-Extrude12 (cut)
    with BuildSketch(Plane(origin=(0, -37.630628171, 0), x_dir=(1, 0, 0), z_dir=(0, 1, 0))):
        Polygon((51.69958099, -7.397734366), (51.69958099, 10.64), (-51.69958099, 10.64), (-51.69958099, -7.397734366), (-32.5, -21.897192277), (32.5, -21.897192277), align=None)
    extrude(amount=CUT_EXTRUDE12_DEPTH, mode=Mode.SUBTRACT)

    # Chamfer1
    chamfer1_edges = [part.edges().sort_by_distance(p)[0] for p in [
        (-78, -16.790458228, -10.64),
        (-62.791796068, -34.734730138, -10.64),
        (-47.944660113, -40.630628171, -10.64),
        (-50.936849431, -40.363118066, -10.64),
        (-76.506508084, -26.207599405, -10.64),
    ]]
    chamfer(chamfer1_edges, length=CHAMFER1_SIZE)

    # Fillet5
    fillet5_edges = [part.edges().sort_by_distance(p)[0] for p in [
        (47.25, -39.130628171, -10.64),
        (40.25, -39.130628171, -10.64),
        (27.88, -39.130628171, -10.64),
        (20.88, -39.130628171, -10.64),
        (-40.25, -39.130628171, -10.64),
        (-47.25, -38.380628171, -10.64),
        (-20.88, -39.130628171, -10.64),
        (-27.88, -39.130628171, -10.64),
    ]]
    fillet(fillet5_edges, radius=FILLET5_R)


solid = part.part
